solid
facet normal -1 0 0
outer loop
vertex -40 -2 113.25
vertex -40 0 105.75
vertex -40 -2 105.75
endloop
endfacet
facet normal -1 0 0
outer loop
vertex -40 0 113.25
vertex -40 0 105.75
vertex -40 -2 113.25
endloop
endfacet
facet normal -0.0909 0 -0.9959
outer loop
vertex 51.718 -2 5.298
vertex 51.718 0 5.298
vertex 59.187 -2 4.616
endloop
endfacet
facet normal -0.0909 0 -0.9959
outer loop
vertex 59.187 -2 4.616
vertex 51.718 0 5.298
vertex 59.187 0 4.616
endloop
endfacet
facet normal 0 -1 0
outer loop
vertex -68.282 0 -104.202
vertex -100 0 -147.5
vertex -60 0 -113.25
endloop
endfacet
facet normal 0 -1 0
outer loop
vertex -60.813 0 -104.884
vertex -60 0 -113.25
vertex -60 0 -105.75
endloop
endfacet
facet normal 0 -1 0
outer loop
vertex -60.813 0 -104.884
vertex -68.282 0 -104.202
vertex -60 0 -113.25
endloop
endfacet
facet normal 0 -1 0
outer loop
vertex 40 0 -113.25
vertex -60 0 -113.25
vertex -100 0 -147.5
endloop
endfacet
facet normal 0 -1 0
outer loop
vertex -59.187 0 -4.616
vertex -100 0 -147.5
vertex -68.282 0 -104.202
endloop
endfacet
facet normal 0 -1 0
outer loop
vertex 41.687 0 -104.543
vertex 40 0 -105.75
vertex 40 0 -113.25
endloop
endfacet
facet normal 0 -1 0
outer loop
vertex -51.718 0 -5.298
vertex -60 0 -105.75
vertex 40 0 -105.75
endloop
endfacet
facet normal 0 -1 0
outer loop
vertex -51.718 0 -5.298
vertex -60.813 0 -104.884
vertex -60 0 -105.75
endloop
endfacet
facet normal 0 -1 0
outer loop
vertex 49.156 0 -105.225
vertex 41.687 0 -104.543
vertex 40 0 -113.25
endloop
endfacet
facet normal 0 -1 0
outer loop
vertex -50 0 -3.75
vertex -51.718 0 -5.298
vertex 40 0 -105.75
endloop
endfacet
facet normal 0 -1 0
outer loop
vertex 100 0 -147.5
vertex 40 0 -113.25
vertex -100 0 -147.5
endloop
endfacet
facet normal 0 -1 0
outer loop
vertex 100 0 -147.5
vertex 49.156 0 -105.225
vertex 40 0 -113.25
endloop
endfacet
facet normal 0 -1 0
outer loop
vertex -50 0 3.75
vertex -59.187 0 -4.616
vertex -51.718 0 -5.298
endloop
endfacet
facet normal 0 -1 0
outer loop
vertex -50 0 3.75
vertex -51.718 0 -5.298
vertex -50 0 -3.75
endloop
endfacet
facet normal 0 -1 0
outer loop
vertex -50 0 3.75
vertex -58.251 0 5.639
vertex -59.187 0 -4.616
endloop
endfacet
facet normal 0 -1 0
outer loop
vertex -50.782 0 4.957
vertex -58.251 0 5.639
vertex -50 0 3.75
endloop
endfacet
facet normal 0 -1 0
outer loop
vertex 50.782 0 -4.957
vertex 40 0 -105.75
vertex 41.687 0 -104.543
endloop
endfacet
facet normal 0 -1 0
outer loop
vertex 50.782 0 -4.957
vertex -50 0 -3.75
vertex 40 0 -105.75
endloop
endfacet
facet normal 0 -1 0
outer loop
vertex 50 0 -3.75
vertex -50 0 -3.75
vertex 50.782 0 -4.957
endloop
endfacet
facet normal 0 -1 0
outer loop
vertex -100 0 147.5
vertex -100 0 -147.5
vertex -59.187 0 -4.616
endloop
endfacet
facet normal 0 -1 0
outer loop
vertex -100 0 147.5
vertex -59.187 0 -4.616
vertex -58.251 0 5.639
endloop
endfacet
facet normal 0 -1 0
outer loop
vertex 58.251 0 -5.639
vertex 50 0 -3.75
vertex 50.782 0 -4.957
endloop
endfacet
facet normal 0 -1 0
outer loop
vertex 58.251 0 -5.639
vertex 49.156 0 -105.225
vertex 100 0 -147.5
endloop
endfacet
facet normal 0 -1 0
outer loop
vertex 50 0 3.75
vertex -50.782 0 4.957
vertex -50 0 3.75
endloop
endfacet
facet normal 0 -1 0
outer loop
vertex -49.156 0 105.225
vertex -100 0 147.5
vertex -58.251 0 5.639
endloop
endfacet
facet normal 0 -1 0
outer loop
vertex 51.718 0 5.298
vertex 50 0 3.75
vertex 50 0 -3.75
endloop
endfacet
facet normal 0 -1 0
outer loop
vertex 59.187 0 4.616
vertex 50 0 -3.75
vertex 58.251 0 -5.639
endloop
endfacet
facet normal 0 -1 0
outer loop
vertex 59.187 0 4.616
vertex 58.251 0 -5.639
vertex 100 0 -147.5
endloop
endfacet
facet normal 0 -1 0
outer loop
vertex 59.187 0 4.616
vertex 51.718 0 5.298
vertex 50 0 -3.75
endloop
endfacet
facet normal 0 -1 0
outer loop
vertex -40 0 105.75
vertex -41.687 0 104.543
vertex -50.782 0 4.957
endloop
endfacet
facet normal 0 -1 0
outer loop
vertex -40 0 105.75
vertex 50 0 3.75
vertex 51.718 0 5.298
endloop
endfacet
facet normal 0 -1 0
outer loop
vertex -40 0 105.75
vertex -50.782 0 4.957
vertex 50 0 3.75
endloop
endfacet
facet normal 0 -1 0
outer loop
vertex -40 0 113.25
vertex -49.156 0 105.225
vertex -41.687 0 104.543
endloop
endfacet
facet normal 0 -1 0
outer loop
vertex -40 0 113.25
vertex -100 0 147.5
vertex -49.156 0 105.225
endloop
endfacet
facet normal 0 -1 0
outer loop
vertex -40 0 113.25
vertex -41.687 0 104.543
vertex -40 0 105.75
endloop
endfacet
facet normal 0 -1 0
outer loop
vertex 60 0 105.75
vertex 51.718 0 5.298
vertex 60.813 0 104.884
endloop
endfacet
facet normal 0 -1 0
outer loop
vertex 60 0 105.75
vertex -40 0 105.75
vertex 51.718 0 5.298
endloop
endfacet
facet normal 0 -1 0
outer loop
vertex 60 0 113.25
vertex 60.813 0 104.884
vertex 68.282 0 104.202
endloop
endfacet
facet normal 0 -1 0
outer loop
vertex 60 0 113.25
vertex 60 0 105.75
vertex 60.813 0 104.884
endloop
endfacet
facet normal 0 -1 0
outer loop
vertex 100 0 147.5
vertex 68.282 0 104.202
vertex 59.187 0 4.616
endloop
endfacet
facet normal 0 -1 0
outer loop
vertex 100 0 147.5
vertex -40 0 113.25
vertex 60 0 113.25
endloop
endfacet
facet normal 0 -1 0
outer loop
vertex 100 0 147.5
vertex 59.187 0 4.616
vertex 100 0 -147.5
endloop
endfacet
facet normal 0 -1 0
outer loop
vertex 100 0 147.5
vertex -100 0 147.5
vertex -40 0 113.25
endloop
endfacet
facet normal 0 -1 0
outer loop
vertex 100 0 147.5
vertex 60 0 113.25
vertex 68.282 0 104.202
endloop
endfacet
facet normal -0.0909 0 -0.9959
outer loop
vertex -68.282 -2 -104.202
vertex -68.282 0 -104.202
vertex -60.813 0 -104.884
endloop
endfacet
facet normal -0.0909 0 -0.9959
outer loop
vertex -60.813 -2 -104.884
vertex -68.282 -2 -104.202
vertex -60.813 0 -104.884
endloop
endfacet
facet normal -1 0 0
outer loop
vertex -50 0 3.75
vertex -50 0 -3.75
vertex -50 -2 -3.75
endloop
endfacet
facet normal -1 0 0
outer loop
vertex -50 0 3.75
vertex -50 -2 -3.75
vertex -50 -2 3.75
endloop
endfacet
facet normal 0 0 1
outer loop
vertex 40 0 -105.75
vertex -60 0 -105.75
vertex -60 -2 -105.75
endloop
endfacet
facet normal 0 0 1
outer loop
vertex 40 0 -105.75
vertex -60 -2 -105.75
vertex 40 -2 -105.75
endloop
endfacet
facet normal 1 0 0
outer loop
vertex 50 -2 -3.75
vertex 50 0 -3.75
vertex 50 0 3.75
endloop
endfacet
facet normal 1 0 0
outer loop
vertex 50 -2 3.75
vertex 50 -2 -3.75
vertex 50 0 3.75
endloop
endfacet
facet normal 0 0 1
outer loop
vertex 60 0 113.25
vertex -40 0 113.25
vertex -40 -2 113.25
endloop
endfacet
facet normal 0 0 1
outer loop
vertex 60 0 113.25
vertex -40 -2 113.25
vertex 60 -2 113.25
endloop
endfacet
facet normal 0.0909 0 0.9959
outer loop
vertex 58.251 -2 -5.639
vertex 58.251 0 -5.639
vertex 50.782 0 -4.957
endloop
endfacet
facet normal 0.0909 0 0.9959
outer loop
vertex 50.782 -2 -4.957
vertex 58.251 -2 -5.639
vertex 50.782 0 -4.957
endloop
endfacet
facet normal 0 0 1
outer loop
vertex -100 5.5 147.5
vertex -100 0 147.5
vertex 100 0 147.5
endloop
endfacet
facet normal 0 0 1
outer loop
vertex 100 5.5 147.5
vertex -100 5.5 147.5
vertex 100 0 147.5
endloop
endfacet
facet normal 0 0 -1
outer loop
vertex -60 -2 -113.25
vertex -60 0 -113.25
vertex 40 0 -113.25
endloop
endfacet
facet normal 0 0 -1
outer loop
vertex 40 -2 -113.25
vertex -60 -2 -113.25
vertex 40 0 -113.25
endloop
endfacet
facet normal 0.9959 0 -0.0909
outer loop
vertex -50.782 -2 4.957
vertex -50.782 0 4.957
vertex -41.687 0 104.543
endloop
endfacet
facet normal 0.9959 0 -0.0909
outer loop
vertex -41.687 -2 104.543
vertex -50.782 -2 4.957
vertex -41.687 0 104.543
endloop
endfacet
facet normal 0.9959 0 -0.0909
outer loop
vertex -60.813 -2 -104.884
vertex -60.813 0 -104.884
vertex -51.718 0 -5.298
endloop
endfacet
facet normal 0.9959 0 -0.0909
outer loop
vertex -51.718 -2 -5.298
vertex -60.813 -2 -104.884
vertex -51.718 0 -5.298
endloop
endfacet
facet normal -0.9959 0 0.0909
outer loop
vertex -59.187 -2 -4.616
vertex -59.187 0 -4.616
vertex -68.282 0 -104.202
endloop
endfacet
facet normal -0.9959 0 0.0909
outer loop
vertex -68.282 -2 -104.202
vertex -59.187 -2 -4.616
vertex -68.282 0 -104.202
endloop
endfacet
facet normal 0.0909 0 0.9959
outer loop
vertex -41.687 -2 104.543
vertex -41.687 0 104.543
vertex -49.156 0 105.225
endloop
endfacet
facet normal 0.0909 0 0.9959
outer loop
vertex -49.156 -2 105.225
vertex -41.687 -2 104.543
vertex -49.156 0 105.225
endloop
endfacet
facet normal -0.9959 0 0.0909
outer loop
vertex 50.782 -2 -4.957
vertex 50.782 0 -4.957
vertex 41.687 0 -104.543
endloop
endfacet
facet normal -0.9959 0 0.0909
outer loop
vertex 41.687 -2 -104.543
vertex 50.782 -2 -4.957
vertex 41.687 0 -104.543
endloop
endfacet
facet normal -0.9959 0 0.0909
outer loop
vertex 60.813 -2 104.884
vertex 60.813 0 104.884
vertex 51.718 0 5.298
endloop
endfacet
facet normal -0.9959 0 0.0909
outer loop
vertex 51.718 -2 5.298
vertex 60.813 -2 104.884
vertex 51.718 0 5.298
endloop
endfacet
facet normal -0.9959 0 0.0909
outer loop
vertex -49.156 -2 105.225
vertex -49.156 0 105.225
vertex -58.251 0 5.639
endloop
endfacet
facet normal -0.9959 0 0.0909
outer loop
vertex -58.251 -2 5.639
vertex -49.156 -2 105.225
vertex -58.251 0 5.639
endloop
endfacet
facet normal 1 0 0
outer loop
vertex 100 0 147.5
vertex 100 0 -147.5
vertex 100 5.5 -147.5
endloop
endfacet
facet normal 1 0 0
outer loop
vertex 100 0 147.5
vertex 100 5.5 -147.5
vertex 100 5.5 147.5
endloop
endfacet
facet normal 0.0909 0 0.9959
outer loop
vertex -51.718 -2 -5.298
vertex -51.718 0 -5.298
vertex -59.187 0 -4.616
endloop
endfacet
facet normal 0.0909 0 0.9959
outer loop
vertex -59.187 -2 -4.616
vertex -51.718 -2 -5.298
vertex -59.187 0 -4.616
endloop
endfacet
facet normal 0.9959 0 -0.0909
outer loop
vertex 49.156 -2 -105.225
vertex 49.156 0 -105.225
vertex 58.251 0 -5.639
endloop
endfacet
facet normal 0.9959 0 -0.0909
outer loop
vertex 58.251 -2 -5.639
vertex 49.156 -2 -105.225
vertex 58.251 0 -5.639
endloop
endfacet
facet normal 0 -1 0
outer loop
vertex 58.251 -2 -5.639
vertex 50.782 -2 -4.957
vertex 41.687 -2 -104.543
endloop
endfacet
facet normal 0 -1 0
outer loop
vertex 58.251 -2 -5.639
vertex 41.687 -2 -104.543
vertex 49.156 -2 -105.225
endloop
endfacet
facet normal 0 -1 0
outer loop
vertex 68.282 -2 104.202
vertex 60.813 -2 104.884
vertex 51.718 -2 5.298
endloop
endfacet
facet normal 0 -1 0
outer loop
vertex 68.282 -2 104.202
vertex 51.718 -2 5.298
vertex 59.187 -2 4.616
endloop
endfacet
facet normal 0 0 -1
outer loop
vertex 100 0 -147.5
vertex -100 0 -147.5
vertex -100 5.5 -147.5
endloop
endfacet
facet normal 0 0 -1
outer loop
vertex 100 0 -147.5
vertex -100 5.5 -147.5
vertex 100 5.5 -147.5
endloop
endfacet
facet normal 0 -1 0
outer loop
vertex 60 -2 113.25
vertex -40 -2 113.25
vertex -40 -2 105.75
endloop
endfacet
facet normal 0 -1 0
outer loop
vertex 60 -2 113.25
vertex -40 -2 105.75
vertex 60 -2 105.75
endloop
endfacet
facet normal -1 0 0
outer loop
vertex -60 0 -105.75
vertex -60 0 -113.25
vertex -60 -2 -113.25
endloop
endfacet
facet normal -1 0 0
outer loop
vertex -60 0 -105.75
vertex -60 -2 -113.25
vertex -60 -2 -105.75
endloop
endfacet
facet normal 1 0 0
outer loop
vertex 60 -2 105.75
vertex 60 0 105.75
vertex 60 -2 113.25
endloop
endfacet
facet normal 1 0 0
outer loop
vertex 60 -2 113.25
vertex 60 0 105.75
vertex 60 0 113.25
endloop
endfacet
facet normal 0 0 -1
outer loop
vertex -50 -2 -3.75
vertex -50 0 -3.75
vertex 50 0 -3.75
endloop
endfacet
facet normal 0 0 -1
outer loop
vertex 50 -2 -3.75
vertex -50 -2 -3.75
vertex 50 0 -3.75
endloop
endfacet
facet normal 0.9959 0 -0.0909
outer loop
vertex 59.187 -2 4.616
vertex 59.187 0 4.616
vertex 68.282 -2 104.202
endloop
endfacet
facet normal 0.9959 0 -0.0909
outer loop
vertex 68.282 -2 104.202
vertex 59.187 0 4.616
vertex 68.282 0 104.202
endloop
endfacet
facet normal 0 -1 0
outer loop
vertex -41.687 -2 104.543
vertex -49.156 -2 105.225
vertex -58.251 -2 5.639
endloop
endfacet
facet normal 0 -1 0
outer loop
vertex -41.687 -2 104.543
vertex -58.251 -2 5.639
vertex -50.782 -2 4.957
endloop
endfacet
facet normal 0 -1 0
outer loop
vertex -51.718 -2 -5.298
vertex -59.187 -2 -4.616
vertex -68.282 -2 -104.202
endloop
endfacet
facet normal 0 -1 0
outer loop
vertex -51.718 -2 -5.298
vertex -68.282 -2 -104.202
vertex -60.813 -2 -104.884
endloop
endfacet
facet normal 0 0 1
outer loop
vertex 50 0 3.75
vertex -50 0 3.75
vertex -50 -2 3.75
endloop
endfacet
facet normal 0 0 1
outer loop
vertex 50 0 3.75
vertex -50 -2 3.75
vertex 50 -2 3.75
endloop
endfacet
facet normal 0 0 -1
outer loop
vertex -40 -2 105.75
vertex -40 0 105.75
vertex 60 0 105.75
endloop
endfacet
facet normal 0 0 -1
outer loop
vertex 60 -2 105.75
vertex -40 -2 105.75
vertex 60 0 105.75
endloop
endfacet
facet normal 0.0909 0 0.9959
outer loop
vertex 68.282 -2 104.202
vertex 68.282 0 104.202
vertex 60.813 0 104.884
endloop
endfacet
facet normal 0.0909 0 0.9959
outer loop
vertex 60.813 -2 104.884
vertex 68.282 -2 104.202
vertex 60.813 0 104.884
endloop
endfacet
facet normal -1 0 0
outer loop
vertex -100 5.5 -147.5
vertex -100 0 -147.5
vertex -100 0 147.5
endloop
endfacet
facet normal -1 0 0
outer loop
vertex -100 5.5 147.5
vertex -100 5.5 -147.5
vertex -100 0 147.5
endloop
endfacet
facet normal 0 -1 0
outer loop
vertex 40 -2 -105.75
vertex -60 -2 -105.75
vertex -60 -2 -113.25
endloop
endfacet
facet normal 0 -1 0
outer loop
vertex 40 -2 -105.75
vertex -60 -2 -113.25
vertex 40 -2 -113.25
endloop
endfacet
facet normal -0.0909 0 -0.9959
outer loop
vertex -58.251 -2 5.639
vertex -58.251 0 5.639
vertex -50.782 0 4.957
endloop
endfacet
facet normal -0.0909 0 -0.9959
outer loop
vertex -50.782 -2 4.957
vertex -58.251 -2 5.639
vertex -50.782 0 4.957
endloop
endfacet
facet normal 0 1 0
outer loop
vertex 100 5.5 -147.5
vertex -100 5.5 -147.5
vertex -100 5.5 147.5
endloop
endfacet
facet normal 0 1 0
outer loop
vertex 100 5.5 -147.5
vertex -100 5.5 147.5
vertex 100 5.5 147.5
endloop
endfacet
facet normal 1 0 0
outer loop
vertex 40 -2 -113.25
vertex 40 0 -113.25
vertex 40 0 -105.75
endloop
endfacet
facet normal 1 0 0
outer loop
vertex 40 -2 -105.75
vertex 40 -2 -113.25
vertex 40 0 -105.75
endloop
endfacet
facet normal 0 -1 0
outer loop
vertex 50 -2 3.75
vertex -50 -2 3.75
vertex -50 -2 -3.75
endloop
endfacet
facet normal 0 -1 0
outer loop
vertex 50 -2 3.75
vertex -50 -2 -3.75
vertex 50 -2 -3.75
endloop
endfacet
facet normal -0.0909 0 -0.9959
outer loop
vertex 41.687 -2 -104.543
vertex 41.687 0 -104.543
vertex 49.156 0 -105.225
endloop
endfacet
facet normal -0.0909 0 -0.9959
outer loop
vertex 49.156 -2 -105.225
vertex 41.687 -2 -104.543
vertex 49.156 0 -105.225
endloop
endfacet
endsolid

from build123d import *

# Parameters (mm, degrees)
F0_W     = 100.000007
F0_H     = 7.500015
F1_DEPTH = 2
F0_W_2   = 100
F0_H_2   = 7.5
F0_W_3   = 100.000004
F2_W     = 200
F2_H     = 295
F3_DEPTH = 5.5


with BuildPart() as f1:
    # F0 (on Front) → F1 (new body)
    with BuildSketch(Plane.XZ):
        with Locations((10.0000135, 109.4999925)):
            Rectangle(F0_W, F0_H)
    extrude(amount=F1_DEPTH)



with BuildPart() as f1b:
    # F0 (on Front) → F1, piece 2 (new body)
    with BuildSketch(Plane.XZ):
        Polygon((-49.156019, 105.224884), (-58.250597, 5.639297), (-50.781679, 4.957199), (-41.687101, 104.542786), align=None)
    extrude(amount=F1_DEPTH)


with BuildPart() as f1c:
    # F0 (on Front) → F1, piece 3 (new body)
    with BuildSketch(Plane.XZ):
        Polygon((60.812838, 104.883835), (51.718248, 5.298248), (59.187182, 4.61615), (68.281756, 104.201736), align=None)
    extrude(amount=F1_DEPTH)


with BuildPart() as f1d:
    # F0 (on Front) → F1, piece 4 (new body)
    with BuildSketch(Plane.XZ):
        with Locations((2e-06, 1.5e-05)):
            Rectangle(F0_W_2, F0_H_2)
    extrude(amount=F1_DEPTH)


with BuildPart() as f1e:
    # F0 (on Front) → F1, piece 5 (new body)
    with BuildSketch(Plane.XZ):
        Polygon((-59.18717, -4.61615), (-68.28175, -104.20174), (-60.81283, -104.883835), (-51.718252, -5.298248), align=None)
    extrude(amount=F1_DEPTH)


with BuildPart() as f1f:
    # F0 (on Front) → F1, piece 6 (new body)
    with BuildSketch(Plane.XZ):
        with Locations((-10, -109.499992)):
            Rectangle(F0_W_3, F0_H_2)
    extrude(amount=F1_DEPTH)


with BuildPart() as f1g:
    # F0 (on Front) → F1, piece 7 (new body)
    with BuildSketch(Plane.XZ):
        Polygon((50.781679, -4.957199), (41.687105, -104.542789), (49.156023, -105.22488), (58.250597, -5.639297), align=None)
    extrude(amount=F1_DEPTH)


with BuildPart() as f1_1:
    add(f1.part)

    add(f1b.part)  # F3 merges F1b

    add(f1c.part)  # F3 merges F1c

    add(f1d.part)  # F3 merges F1d

    add(f1e.part)  # F3 merges F1e

    add(f1f.part)  # F3 merges F1f

    add(f1g.part)  # F3 merges F1g
    # F2 (on Front) → F3 (join)
    with BuildSketch(Plane.XZ):
        with Locations((2e-06, 0)):
            Rectangle(F2_W, F2_H)
    extrude(amount=-F3_DEPTH)


solid = f1_1.part
